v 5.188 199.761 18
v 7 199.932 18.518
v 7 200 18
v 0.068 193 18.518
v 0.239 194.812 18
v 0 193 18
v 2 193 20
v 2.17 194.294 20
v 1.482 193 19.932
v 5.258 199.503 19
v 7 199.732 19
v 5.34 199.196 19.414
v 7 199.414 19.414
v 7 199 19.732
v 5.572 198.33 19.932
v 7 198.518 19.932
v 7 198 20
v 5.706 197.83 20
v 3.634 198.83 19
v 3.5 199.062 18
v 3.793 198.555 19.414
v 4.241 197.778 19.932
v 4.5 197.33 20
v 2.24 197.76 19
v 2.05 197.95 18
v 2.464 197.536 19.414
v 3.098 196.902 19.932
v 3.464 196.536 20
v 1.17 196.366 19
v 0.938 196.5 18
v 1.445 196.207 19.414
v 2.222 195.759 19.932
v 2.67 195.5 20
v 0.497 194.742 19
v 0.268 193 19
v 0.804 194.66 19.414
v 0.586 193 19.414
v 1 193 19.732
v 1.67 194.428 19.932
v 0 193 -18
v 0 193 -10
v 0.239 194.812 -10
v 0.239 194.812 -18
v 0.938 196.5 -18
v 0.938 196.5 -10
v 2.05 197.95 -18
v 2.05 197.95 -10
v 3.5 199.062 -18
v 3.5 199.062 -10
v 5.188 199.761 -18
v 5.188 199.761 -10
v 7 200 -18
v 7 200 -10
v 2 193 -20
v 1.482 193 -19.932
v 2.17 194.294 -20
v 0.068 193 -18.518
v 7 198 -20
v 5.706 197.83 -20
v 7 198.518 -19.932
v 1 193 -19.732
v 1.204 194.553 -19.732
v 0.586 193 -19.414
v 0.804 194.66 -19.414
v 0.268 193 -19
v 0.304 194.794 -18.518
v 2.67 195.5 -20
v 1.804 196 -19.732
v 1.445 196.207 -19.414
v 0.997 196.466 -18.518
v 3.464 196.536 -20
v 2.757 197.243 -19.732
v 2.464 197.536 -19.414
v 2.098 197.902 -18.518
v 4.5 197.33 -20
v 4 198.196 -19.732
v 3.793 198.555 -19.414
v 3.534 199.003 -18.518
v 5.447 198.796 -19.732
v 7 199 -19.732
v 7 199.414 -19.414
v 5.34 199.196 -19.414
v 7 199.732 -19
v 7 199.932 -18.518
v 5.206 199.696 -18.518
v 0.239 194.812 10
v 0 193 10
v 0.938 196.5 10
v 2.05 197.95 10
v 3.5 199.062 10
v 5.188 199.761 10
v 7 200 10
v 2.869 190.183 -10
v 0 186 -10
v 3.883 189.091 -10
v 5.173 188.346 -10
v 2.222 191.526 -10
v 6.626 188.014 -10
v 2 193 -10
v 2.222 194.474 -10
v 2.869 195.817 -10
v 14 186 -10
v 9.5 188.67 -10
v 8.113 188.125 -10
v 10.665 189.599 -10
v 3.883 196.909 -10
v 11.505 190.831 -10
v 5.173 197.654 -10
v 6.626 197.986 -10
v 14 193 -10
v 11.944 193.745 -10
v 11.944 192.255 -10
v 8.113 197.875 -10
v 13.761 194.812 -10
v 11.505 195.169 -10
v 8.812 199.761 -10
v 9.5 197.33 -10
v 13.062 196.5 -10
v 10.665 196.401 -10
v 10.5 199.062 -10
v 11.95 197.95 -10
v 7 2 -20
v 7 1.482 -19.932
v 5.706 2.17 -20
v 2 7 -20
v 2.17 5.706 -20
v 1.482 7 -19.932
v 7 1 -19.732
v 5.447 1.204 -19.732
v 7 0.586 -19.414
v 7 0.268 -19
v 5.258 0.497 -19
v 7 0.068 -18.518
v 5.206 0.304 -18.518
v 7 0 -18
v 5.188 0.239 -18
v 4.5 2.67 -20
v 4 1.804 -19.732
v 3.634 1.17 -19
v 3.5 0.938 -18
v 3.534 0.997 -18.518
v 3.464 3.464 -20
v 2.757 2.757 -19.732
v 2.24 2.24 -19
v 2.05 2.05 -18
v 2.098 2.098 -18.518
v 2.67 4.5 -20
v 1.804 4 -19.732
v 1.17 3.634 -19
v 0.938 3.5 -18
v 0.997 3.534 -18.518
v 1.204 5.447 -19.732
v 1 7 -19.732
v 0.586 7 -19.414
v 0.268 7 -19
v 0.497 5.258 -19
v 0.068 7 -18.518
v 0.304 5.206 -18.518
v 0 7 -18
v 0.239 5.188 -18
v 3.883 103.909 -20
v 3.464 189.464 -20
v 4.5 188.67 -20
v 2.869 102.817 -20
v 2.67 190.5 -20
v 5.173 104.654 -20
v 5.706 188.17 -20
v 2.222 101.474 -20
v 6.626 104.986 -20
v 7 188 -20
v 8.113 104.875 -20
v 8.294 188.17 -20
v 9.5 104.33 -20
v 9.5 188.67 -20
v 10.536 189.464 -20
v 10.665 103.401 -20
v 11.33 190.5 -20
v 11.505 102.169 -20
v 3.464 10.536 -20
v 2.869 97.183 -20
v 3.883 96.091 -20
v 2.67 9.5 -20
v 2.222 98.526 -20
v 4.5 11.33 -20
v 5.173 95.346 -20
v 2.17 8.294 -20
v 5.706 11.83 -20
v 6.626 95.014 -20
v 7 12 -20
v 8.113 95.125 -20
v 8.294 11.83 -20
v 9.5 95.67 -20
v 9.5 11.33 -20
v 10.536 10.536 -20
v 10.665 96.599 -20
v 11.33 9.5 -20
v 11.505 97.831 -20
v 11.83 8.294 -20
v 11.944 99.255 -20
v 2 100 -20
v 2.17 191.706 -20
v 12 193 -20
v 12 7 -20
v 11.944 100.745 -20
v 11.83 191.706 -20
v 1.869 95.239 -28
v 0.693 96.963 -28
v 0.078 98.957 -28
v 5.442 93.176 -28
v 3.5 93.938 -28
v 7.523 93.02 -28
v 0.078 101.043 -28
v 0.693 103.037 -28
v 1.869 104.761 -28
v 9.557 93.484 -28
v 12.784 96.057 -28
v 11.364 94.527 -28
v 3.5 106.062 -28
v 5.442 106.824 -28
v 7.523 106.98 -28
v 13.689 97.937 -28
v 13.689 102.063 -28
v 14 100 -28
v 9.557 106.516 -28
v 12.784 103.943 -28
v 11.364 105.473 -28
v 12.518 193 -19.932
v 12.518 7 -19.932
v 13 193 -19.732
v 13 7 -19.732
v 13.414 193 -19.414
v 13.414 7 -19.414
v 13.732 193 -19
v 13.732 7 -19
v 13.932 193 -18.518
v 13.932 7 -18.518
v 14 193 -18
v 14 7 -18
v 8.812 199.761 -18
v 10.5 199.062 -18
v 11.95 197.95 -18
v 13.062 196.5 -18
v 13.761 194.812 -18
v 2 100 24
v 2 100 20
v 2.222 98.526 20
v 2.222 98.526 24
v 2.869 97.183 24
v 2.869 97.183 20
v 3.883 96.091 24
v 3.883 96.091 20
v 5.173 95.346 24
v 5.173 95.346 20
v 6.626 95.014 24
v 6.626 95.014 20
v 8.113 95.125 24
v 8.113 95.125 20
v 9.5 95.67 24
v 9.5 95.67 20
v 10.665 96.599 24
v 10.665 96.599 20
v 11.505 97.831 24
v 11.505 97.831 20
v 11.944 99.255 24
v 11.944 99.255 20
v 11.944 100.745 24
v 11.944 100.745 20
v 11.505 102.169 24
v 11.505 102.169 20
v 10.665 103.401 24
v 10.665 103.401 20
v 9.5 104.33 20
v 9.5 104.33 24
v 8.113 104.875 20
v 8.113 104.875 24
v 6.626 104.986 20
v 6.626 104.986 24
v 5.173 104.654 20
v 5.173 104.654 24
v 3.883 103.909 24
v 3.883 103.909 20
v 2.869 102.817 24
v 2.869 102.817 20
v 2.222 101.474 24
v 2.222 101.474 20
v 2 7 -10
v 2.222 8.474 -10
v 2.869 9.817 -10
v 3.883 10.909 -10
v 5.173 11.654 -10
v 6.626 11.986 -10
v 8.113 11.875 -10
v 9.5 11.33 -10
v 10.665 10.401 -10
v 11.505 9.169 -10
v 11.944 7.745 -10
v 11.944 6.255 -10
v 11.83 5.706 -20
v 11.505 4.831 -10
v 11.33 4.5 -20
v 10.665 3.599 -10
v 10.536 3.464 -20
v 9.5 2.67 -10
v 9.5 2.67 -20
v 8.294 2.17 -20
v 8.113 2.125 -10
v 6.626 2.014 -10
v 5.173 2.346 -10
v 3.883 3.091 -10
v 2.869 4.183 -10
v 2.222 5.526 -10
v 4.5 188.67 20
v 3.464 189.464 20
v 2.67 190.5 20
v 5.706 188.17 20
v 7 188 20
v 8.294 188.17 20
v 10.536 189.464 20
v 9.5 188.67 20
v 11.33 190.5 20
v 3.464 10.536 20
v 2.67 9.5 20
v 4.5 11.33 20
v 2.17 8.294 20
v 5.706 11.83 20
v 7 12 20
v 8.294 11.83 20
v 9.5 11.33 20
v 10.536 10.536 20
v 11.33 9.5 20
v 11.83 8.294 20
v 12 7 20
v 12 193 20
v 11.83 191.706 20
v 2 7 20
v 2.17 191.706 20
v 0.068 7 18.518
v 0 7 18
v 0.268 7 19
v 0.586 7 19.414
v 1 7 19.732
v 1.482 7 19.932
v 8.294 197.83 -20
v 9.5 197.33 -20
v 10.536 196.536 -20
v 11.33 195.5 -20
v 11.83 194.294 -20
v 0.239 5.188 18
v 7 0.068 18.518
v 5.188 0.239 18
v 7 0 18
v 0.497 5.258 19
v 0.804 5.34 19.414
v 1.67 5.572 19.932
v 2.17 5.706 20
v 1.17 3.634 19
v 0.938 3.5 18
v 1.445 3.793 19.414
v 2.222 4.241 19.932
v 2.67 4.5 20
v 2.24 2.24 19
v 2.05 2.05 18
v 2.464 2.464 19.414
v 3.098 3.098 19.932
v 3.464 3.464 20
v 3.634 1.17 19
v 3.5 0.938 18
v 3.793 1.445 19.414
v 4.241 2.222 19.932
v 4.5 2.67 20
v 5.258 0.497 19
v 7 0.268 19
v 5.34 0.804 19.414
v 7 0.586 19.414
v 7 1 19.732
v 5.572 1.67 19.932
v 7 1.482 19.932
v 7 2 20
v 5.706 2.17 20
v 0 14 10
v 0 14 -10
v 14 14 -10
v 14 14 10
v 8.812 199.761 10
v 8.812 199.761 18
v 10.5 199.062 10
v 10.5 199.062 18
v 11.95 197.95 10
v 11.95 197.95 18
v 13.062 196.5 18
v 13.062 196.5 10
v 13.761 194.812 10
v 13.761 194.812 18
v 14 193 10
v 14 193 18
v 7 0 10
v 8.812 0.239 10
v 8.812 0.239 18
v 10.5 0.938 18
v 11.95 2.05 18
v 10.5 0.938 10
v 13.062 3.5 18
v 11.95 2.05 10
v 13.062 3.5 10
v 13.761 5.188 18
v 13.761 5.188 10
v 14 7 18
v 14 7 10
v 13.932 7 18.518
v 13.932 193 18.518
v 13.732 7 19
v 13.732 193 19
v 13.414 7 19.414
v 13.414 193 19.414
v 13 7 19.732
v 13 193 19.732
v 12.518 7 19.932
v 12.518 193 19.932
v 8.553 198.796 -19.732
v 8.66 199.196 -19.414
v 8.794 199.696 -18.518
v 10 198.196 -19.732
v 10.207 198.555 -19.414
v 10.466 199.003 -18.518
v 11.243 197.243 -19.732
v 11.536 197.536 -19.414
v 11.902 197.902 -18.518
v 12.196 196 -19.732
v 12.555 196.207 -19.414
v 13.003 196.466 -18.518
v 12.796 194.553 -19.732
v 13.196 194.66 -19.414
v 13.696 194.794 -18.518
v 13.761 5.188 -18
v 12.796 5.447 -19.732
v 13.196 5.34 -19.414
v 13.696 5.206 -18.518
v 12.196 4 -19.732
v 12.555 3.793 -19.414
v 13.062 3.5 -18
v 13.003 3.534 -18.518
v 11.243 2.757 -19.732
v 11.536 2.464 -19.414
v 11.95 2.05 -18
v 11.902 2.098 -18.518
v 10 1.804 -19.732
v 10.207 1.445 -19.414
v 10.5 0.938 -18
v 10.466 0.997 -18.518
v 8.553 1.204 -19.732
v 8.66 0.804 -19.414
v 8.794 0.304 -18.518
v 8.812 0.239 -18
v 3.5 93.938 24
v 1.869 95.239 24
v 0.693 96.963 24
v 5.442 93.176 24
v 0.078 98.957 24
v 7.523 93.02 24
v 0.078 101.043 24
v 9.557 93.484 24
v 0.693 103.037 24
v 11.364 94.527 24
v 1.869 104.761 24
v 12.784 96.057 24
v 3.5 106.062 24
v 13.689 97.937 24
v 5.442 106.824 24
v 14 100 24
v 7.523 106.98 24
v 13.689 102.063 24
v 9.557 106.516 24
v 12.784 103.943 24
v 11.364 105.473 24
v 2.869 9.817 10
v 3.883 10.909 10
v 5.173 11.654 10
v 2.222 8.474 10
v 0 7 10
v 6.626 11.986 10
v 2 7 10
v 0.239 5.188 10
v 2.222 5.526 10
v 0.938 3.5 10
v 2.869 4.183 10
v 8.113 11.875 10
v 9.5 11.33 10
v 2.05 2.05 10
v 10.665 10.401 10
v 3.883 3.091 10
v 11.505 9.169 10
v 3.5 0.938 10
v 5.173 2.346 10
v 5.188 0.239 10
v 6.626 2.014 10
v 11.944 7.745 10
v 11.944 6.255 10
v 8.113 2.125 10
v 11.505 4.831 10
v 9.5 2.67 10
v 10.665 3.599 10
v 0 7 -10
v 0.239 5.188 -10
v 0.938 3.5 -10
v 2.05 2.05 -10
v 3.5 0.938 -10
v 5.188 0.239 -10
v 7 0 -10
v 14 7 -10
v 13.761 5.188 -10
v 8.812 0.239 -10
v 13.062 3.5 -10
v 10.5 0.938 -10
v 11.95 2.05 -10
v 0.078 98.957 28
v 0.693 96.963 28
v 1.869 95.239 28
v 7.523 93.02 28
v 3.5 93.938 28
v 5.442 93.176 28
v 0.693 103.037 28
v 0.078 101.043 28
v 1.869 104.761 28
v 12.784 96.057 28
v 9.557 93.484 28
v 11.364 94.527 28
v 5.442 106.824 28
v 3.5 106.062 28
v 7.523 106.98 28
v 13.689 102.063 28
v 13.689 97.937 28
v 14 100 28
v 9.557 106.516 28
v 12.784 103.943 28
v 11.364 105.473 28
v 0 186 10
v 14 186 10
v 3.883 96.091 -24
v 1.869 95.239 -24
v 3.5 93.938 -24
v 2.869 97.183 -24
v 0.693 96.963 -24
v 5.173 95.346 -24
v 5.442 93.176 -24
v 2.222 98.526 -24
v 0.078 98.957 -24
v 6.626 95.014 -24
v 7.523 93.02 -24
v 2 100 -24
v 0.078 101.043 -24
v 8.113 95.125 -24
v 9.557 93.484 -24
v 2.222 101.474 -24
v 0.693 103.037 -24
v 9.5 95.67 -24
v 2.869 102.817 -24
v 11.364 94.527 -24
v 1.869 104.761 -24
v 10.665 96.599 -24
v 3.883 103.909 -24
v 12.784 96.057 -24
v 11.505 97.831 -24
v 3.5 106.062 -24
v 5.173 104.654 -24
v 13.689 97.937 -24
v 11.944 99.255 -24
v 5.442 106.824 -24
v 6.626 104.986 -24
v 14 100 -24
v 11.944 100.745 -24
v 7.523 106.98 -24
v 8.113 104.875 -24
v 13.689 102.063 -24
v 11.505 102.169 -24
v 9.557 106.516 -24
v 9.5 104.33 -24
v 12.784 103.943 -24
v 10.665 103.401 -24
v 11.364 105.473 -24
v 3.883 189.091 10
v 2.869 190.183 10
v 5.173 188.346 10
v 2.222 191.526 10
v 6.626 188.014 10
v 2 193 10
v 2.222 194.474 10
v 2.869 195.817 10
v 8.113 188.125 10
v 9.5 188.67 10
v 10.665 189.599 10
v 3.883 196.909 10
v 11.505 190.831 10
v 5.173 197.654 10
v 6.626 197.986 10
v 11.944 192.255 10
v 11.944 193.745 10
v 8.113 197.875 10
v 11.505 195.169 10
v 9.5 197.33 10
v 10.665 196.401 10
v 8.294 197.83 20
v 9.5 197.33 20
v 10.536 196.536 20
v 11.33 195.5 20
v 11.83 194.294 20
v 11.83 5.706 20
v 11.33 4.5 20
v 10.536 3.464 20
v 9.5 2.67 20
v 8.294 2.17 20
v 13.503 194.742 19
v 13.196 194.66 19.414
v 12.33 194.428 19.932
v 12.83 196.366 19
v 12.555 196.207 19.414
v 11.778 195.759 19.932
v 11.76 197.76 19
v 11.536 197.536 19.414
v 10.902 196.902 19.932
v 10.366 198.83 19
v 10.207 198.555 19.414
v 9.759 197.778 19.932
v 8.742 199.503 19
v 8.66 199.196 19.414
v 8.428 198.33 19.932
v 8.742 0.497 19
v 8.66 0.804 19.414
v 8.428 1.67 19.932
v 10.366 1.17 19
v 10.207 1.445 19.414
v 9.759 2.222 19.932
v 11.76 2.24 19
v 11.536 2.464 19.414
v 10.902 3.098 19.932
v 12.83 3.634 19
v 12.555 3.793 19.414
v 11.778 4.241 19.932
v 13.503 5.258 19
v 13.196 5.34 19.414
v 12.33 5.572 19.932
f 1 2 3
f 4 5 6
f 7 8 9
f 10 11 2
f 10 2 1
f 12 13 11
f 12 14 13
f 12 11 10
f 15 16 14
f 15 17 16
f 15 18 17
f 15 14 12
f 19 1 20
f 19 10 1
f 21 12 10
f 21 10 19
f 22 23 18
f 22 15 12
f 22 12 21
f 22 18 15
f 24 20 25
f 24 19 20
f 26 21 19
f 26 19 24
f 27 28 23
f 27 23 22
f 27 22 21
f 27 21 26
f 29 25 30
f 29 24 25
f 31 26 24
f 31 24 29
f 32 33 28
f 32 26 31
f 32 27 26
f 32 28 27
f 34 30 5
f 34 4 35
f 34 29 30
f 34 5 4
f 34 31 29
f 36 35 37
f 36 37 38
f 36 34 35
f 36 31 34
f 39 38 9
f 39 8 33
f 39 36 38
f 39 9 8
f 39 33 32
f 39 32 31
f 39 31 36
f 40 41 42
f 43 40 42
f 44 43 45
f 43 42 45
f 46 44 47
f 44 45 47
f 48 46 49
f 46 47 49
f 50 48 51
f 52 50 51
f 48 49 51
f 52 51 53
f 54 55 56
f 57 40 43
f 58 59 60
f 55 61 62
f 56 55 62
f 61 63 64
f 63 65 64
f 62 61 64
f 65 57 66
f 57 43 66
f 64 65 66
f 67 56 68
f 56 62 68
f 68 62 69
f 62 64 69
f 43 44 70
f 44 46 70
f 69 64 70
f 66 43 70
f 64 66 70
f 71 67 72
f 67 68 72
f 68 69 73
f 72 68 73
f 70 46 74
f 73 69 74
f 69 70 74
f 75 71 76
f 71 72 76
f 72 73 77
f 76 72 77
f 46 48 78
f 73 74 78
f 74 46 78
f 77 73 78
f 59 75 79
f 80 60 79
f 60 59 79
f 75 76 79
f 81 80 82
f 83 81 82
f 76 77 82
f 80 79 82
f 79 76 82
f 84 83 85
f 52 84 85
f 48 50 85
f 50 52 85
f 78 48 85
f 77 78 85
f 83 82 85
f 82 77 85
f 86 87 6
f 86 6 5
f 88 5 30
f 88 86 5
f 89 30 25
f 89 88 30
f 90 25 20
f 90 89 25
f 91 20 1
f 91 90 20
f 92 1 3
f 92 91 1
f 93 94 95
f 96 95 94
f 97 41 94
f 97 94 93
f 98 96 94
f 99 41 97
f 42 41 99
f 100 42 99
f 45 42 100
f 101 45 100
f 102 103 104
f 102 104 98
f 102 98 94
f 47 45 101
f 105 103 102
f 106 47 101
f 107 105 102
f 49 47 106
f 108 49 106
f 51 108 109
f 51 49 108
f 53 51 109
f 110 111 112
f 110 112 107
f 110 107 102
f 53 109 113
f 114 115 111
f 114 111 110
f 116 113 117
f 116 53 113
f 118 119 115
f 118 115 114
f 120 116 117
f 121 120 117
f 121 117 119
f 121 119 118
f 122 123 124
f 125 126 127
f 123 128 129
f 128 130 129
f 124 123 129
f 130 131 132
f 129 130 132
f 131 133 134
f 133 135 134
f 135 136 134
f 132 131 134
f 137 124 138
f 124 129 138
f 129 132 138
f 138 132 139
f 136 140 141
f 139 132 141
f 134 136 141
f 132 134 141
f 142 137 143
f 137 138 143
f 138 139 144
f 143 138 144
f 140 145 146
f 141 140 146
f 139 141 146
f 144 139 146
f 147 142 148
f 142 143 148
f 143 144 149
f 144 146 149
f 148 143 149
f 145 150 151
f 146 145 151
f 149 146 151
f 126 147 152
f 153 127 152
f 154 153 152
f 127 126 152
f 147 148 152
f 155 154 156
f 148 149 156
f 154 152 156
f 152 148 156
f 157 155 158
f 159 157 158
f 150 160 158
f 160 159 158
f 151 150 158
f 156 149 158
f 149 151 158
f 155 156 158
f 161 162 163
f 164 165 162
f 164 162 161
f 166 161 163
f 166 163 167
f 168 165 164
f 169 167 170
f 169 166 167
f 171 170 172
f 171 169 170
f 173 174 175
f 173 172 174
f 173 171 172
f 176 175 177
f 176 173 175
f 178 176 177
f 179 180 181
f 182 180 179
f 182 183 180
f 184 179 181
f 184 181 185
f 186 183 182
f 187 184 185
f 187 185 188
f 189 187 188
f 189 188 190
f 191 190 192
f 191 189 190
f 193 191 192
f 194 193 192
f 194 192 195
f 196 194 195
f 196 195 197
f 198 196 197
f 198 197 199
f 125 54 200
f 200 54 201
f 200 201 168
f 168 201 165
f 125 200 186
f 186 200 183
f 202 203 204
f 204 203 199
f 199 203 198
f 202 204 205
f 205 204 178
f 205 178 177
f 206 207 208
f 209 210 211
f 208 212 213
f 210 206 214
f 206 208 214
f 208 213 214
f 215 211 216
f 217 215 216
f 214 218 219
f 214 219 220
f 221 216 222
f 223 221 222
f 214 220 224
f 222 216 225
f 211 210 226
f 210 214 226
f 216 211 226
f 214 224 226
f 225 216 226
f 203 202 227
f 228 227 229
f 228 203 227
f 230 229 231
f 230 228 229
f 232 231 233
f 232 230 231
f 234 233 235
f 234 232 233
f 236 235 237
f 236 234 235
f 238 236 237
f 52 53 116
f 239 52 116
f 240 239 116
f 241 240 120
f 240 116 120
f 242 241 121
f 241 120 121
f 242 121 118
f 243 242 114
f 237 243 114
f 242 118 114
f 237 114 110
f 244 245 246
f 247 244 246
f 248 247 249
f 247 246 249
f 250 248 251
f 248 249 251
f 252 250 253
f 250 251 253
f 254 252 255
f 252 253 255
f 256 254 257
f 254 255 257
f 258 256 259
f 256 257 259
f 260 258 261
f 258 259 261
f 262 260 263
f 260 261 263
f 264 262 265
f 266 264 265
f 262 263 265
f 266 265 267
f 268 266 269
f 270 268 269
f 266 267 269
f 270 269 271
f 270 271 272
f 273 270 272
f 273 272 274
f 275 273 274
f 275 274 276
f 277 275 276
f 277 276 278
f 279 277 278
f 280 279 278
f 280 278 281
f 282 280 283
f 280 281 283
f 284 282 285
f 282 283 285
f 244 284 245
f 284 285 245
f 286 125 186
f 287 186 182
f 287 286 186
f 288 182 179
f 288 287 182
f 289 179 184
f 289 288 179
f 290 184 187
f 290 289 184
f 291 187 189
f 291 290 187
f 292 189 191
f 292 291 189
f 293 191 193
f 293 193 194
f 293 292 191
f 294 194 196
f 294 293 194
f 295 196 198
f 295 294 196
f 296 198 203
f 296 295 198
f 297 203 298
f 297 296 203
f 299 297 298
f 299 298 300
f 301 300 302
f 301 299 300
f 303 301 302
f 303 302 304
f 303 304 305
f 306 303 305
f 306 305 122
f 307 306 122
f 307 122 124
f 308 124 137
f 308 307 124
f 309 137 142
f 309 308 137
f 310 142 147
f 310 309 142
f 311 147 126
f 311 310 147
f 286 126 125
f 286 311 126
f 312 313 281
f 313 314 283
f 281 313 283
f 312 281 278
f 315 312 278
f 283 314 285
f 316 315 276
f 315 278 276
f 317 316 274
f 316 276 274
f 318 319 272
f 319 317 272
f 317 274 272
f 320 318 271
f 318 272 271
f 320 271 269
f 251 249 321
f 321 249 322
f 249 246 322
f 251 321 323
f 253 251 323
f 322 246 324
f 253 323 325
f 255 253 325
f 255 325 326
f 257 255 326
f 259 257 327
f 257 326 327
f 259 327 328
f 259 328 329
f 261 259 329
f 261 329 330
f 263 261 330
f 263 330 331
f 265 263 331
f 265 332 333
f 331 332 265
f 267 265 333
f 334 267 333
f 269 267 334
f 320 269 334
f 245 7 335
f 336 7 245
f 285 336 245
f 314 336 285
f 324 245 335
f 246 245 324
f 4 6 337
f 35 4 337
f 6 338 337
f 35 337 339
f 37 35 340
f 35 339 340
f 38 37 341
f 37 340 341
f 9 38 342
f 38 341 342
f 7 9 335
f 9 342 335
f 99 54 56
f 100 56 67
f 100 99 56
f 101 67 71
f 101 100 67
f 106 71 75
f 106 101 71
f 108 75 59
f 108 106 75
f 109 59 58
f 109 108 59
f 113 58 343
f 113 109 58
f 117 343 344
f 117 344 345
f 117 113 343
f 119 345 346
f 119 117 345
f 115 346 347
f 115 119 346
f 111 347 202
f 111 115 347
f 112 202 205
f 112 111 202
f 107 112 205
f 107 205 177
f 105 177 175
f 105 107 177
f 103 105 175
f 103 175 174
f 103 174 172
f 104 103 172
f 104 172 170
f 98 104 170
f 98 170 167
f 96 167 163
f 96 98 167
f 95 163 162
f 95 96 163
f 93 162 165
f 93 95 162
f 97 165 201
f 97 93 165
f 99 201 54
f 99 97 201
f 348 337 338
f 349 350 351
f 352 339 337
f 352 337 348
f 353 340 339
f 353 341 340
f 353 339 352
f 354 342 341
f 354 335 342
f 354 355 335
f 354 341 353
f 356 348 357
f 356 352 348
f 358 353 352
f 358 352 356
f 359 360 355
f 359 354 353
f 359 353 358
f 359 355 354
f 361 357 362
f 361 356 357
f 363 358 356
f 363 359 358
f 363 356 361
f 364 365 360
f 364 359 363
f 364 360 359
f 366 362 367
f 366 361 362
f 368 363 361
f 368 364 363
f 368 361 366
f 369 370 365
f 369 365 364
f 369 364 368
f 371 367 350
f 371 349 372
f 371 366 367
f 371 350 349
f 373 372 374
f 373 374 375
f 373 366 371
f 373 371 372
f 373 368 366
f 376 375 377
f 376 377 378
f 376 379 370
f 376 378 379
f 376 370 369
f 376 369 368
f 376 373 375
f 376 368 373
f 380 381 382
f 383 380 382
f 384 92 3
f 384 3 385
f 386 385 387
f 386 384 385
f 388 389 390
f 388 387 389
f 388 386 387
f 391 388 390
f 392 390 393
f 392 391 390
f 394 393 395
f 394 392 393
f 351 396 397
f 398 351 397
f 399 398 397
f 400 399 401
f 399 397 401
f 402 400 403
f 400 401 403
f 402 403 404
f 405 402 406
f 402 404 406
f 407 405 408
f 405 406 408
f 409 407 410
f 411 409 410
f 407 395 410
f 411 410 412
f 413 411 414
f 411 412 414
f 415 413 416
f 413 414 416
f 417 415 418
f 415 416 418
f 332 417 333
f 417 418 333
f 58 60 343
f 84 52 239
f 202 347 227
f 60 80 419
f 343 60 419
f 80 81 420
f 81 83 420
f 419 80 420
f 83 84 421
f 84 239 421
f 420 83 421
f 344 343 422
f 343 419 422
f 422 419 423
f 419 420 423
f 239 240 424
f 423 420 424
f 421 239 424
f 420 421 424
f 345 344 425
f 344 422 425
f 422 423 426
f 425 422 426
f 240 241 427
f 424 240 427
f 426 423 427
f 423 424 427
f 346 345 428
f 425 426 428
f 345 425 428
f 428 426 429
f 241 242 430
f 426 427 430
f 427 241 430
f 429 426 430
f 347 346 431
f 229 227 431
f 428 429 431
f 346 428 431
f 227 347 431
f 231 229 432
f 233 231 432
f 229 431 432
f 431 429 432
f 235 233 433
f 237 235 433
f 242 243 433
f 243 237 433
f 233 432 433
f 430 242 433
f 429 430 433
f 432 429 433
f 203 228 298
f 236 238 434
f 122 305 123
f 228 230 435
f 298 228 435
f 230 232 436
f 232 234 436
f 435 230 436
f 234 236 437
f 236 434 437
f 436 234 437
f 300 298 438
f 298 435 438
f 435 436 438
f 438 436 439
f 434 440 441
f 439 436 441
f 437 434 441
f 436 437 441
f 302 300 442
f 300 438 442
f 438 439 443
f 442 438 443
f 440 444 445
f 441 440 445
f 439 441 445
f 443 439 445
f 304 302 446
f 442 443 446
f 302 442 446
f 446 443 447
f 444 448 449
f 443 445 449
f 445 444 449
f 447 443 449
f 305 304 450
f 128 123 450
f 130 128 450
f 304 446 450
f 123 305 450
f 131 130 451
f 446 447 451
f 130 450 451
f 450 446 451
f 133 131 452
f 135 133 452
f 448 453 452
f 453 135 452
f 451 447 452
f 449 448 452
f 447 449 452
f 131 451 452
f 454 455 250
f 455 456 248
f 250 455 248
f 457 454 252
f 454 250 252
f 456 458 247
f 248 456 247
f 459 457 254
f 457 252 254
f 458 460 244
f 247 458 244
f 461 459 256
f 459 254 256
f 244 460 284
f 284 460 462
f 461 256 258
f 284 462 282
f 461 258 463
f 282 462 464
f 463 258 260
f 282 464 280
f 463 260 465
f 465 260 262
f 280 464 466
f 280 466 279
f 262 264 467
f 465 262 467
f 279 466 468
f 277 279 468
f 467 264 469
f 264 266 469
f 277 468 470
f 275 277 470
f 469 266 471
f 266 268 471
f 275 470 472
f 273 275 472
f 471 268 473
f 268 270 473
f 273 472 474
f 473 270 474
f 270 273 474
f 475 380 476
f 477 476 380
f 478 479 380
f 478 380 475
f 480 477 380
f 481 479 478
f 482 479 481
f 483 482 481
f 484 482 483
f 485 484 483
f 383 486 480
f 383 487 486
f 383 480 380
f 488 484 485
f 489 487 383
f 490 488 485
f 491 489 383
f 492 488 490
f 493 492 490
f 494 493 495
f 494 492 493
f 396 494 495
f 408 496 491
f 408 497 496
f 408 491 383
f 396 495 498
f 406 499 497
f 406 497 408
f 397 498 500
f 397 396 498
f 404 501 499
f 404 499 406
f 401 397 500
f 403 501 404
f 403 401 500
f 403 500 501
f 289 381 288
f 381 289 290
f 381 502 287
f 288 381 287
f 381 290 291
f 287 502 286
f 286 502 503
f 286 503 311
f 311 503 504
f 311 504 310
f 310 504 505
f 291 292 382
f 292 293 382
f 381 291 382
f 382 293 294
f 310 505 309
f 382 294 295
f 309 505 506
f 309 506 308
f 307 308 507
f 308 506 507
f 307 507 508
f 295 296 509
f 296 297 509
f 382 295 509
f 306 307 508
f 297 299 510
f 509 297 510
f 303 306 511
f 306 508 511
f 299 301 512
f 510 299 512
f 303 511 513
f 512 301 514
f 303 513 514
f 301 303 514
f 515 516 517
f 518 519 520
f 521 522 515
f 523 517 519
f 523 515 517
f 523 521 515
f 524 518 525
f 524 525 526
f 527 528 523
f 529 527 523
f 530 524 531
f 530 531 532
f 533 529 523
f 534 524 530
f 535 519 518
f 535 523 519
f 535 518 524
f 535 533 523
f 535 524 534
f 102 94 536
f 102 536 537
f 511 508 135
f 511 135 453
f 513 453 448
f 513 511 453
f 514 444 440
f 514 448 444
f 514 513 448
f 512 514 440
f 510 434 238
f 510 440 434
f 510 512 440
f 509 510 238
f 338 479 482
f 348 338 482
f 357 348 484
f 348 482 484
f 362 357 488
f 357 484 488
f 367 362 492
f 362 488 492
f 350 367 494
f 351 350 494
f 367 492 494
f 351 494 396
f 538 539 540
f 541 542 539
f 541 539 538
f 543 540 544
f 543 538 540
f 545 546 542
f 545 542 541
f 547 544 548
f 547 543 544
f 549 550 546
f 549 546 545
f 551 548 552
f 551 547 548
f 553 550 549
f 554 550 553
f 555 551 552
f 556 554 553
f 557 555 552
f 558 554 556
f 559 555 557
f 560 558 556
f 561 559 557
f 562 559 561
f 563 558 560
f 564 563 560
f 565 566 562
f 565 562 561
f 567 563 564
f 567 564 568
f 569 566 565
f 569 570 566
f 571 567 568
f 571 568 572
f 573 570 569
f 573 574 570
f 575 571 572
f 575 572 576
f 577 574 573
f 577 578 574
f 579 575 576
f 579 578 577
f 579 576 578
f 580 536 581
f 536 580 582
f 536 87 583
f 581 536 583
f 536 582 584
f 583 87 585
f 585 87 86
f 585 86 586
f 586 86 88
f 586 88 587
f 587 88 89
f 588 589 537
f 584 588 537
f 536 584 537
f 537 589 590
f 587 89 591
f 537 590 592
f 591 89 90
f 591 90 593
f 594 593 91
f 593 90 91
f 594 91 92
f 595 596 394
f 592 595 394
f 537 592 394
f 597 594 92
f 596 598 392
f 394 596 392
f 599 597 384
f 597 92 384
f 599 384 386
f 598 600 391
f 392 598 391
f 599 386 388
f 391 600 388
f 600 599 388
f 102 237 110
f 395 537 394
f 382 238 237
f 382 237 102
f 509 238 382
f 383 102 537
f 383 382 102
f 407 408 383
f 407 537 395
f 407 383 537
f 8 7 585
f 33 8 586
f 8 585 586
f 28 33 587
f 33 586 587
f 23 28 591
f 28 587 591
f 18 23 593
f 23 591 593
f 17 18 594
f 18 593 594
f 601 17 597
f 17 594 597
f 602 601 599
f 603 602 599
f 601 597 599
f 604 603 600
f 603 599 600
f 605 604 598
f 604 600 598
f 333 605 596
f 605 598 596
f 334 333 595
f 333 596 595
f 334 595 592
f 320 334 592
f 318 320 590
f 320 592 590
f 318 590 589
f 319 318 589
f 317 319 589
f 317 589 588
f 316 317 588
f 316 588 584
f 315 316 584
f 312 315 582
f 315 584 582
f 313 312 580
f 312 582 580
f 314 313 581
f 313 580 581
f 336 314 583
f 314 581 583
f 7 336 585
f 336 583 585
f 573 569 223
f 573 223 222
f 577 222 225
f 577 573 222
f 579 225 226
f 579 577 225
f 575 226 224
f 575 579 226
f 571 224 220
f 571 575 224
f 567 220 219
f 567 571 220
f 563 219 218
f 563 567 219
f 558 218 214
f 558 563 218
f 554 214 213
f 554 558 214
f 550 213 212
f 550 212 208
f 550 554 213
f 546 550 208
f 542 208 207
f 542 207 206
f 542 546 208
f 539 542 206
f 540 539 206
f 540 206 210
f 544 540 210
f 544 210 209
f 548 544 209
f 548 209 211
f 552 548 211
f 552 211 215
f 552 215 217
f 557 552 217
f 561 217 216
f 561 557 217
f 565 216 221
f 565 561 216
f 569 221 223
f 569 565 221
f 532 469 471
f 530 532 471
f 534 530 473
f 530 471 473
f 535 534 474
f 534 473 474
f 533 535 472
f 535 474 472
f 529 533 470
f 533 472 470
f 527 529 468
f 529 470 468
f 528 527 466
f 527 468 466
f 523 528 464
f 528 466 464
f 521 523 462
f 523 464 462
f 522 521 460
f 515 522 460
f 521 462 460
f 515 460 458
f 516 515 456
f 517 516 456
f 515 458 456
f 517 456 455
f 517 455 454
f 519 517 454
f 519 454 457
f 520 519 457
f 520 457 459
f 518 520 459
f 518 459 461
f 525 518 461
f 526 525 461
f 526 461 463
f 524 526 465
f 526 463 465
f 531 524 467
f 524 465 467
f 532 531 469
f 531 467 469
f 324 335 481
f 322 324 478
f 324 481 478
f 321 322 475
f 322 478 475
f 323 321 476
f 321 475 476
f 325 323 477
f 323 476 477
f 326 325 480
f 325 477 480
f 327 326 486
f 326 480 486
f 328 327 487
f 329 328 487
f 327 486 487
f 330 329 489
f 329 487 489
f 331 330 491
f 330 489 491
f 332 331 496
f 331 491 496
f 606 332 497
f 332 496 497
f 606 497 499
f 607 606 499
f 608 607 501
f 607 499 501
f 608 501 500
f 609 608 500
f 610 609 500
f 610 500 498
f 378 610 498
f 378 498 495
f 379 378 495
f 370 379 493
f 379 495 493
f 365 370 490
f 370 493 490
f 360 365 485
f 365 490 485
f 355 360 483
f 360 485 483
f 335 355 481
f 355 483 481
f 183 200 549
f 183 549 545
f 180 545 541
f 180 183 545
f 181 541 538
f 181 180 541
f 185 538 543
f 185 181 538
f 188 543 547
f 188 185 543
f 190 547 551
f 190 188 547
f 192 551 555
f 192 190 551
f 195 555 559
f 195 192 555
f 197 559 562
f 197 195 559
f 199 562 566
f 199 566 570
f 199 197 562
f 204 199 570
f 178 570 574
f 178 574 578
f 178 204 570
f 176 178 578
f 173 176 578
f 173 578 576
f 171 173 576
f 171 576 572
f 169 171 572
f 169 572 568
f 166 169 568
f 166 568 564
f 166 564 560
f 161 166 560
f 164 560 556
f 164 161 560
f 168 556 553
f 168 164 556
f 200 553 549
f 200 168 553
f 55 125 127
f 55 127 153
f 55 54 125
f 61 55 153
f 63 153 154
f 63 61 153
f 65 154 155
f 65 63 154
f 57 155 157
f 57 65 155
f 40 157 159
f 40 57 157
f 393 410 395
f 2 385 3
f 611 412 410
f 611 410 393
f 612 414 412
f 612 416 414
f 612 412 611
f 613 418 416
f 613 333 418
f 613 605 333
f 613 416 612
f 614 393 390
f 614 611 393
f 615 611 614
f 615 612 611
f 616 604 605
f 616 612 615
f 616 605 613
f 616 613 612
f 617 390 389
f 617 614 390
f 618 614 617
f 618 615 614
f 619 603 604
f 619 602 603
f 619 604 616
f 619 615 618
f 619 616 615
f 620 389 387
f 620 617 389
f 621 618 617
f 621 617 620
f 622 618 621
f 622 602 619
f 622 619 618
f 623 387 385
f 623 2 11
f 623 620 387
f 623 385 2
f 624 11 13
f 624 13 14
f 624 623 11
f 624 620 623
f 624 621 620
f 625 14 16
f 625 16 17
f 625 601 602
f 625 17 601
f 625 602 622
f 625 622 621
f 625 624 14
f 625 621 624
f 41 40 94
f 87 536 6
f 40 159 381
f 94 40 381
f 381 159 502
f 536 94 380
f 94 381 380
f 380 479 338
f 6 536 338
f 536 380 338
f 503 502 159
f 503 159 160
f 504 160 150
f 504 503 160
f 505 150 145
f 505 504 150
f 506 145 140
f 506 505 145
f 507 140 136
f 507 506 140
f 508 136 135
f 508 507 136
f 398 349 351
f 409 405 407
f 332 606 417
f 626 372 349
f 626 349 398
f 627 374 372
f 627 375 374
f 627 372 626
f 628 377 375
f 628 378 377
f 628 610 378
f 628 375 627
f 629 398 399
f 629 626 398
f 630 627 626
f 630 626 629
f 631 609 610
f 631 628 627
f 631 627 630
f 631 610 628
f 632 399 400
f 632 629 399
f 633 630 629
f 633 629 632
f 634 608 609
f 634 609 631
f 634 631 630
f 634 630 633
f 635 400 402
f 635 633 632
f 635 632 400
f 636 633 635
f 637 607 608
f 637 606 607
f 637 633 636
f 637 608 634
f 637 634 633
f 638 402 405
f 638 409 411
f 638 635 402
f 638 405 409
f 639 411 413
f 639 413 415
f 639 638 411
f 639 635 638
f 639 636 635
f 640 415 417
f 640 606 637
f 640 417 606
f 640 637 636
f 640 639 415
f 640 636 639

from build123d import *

# Parameters (mm, degrees)
SKETCH1_W           = 14
SKETCH1_H           = 20
BOSS_EXTRUDE1_DEPTH = 200
SKETCH2_W           = 14
SKETCH2_H           = 10
CUT_EXTRUDE1_DEPTH  = 14
SKETCH5_R           = 5
CUT_EXTRUDE4_DEPTH  = 10
SKETCH4_W           = 14
SKETCH4_H           = 10
CUT_EXTRUDE3_DEPTH  = 14
SKETCH6_R           = 5
CUT_EXTRUDE5_DEPTH  = 10
FILLET3_R           = 7
SKETCH7_R           = 5
BOSS_EXTRUDE2_DEPTH = 4
SKETCH8_R           = 7
BOSS_EXTRUDE3_DEPTH = 4
FILLET2_R           = 2


with BuildPart() as part:
    # Sketch1 → Boss-Extrude1 (new body)
    with BuildSketch(Plane(origin=(0, 0, 0), x_dir=(1, 0, 0), z_dir=(0, 1, 0))):
        with Locations((7, -10)):
            Rectangle(SKETCH1_W, SKETCH1_H)
    boss_extrude1 = extrude(amount=BOSS_EXTRUDE1_DEPTH)

    # Sketch2 → Cut-Extrude1 (cut)
    with BuildSketch(Plane.XZ):
        with Locations((7, 5)):
            Rectangle(SKETCH2_W, SKETCH2_H)
    cut_extrude1 = extrude(amount=-CUT_EXTRUDE1_DEPTH, mode=Mode.SUBTRACT)

    # Sketch5 → Cut-Extrude4 (cut)
    with BuildSketch(Plane(origin=(0, 0, 10), x_dir=(-1, 0, 0), z_dir=(0, 0, -1))):
        with Locations((-7, 7)):
            Circle(SKETCH5_R)
    cut_extrude4 = extrude(amount=-CUT_EXTRUDE4_DEPTH, mode=Mode.SUBTRACT)

    # Sketch4 → Cut-Extrude3 (cut)
    with BuildSketch(Plane(origin=(0, 200, 0), x_dir=(1, 0, 0), z_dir=(0, 1, 0))):
        with Locations((7, -5)):
            Rectangle(SKETCH4_W, SKETCH4_H)
    cut_extrude3 = extrude(amount=-CUT_EXTRUDE3_DEPTH, mode=Mode.SUBTRACT)

    # Sketch6 → Cut-Extrude5 (cut)
    with BuildSketch(Plane(origin=(0, 0, 10), x_dir=(-1, 0, 0), z_dir=(0, 0, -1))):
        with Locations((-7, 193)):
            Circle(SKETCH6_R)
    cut_extrude5 = extrude(amount=-CUT_EXTRUDE5_DEPTH, mode=Mode.SUBTRACT)

    # Mirror1: Boss-Extrude1, Cut-Extrude1, Cut-Extrude4, Cut-Extrude3, Cut-Extrude5 across plane
    add(boss_extrude1.mirror(Plane(origin=(0, 200, 0), x_dir=(1, 0, 0), z_dir=(0, 0, 1))))
    add(cut_extrude1.mirror(Plane(origin=(0, 200, 0), x_dir=(1, 0, 0), z_dir=(0, 0, 1))), mode=Mode.SUBTRACT)
    add(cut_extrude4.mirror(Plane(origin=(0, 200, 0), x_dir=(1, 0, 0), z_dir=(0, 0, 1))), mode=Mode.SUBTRACT)
    add(cut_extrude3.mirror(Plane(origin=(0, 200, 0), x_dir=(1, 0, 0), z_dir=(0, 0, 1))), mode=Mode.SUBTRACT)
    add(cut_extrude5.mirror(Plane(origin=(0, 200, 0), x_dir=(1, 0, 0), z_dir=(0, 0, 1))), mode=Mode.SUBTRACT)

    # Fillet3
    fillet3_edges = [part.edges().sort_by_distance(p)[0] for p in [
        (0, 200, 15),
        (14, 200, 15),
        (0, 200, -15),
        (14, 200, -15),
        (0, 0, -15),
        (14, 0, -15),
        (0, 0, 15),
        (14, 0, 15),
    ]]
    fillet(fillet3_edges, radius=FILLET3_R - 0.0001)  # a hair under: the kernel refuses the full size

    # Sketch7 → Boss-Extrude2 (add)
    with BuildSketch(Plane.XY.offset(20)):
        with Locations(Location((7, 100, 0), (0, 0, 180))):
            Circle(SKETCH7_R)
    boss_extrude2 = extrude(amount=BOSS_EXTRUDE2_DEPTH)

    # Sketch8 → Boss-Extrude3 (add)
    with BuildSketch(Plane.XY.offset(24)):
        with Locations((7, 100)):
            Circle(SKETCH8_R)
    boss_extrude3 = extrude(amount=BOSS_EXTRUDE3_DEPTH)

    # Mirror2: Boss-Extrude2, Boss-Extrude3 across plane
    add(boss_extrude2.mirror(Plane.XY))
    add(boss_extrude3.mirror(Plane.XY))

    # Fillet2
    fillet2_edges = [part.edges().sort_by_distance(p)[0] for p in [
        (14, 100, 20),
        (0, 100, 20),
        (0, 100, -20),
        (14, 100, -20),
        (11.949776758, 2.050223242, 20),
        (11.949776758, 197.949776758, 20),
        (11.949776758, 2.050223242, -20),
        (11.949776758, 197.949776758, -20),
        (2.050223242, 197.949776758, -20),
    ]]
    fillet(fillet2_edges, radius=FILLET2_R - 0.0001)  # a hair under: the kernel refuses the full size


solid = part.part
